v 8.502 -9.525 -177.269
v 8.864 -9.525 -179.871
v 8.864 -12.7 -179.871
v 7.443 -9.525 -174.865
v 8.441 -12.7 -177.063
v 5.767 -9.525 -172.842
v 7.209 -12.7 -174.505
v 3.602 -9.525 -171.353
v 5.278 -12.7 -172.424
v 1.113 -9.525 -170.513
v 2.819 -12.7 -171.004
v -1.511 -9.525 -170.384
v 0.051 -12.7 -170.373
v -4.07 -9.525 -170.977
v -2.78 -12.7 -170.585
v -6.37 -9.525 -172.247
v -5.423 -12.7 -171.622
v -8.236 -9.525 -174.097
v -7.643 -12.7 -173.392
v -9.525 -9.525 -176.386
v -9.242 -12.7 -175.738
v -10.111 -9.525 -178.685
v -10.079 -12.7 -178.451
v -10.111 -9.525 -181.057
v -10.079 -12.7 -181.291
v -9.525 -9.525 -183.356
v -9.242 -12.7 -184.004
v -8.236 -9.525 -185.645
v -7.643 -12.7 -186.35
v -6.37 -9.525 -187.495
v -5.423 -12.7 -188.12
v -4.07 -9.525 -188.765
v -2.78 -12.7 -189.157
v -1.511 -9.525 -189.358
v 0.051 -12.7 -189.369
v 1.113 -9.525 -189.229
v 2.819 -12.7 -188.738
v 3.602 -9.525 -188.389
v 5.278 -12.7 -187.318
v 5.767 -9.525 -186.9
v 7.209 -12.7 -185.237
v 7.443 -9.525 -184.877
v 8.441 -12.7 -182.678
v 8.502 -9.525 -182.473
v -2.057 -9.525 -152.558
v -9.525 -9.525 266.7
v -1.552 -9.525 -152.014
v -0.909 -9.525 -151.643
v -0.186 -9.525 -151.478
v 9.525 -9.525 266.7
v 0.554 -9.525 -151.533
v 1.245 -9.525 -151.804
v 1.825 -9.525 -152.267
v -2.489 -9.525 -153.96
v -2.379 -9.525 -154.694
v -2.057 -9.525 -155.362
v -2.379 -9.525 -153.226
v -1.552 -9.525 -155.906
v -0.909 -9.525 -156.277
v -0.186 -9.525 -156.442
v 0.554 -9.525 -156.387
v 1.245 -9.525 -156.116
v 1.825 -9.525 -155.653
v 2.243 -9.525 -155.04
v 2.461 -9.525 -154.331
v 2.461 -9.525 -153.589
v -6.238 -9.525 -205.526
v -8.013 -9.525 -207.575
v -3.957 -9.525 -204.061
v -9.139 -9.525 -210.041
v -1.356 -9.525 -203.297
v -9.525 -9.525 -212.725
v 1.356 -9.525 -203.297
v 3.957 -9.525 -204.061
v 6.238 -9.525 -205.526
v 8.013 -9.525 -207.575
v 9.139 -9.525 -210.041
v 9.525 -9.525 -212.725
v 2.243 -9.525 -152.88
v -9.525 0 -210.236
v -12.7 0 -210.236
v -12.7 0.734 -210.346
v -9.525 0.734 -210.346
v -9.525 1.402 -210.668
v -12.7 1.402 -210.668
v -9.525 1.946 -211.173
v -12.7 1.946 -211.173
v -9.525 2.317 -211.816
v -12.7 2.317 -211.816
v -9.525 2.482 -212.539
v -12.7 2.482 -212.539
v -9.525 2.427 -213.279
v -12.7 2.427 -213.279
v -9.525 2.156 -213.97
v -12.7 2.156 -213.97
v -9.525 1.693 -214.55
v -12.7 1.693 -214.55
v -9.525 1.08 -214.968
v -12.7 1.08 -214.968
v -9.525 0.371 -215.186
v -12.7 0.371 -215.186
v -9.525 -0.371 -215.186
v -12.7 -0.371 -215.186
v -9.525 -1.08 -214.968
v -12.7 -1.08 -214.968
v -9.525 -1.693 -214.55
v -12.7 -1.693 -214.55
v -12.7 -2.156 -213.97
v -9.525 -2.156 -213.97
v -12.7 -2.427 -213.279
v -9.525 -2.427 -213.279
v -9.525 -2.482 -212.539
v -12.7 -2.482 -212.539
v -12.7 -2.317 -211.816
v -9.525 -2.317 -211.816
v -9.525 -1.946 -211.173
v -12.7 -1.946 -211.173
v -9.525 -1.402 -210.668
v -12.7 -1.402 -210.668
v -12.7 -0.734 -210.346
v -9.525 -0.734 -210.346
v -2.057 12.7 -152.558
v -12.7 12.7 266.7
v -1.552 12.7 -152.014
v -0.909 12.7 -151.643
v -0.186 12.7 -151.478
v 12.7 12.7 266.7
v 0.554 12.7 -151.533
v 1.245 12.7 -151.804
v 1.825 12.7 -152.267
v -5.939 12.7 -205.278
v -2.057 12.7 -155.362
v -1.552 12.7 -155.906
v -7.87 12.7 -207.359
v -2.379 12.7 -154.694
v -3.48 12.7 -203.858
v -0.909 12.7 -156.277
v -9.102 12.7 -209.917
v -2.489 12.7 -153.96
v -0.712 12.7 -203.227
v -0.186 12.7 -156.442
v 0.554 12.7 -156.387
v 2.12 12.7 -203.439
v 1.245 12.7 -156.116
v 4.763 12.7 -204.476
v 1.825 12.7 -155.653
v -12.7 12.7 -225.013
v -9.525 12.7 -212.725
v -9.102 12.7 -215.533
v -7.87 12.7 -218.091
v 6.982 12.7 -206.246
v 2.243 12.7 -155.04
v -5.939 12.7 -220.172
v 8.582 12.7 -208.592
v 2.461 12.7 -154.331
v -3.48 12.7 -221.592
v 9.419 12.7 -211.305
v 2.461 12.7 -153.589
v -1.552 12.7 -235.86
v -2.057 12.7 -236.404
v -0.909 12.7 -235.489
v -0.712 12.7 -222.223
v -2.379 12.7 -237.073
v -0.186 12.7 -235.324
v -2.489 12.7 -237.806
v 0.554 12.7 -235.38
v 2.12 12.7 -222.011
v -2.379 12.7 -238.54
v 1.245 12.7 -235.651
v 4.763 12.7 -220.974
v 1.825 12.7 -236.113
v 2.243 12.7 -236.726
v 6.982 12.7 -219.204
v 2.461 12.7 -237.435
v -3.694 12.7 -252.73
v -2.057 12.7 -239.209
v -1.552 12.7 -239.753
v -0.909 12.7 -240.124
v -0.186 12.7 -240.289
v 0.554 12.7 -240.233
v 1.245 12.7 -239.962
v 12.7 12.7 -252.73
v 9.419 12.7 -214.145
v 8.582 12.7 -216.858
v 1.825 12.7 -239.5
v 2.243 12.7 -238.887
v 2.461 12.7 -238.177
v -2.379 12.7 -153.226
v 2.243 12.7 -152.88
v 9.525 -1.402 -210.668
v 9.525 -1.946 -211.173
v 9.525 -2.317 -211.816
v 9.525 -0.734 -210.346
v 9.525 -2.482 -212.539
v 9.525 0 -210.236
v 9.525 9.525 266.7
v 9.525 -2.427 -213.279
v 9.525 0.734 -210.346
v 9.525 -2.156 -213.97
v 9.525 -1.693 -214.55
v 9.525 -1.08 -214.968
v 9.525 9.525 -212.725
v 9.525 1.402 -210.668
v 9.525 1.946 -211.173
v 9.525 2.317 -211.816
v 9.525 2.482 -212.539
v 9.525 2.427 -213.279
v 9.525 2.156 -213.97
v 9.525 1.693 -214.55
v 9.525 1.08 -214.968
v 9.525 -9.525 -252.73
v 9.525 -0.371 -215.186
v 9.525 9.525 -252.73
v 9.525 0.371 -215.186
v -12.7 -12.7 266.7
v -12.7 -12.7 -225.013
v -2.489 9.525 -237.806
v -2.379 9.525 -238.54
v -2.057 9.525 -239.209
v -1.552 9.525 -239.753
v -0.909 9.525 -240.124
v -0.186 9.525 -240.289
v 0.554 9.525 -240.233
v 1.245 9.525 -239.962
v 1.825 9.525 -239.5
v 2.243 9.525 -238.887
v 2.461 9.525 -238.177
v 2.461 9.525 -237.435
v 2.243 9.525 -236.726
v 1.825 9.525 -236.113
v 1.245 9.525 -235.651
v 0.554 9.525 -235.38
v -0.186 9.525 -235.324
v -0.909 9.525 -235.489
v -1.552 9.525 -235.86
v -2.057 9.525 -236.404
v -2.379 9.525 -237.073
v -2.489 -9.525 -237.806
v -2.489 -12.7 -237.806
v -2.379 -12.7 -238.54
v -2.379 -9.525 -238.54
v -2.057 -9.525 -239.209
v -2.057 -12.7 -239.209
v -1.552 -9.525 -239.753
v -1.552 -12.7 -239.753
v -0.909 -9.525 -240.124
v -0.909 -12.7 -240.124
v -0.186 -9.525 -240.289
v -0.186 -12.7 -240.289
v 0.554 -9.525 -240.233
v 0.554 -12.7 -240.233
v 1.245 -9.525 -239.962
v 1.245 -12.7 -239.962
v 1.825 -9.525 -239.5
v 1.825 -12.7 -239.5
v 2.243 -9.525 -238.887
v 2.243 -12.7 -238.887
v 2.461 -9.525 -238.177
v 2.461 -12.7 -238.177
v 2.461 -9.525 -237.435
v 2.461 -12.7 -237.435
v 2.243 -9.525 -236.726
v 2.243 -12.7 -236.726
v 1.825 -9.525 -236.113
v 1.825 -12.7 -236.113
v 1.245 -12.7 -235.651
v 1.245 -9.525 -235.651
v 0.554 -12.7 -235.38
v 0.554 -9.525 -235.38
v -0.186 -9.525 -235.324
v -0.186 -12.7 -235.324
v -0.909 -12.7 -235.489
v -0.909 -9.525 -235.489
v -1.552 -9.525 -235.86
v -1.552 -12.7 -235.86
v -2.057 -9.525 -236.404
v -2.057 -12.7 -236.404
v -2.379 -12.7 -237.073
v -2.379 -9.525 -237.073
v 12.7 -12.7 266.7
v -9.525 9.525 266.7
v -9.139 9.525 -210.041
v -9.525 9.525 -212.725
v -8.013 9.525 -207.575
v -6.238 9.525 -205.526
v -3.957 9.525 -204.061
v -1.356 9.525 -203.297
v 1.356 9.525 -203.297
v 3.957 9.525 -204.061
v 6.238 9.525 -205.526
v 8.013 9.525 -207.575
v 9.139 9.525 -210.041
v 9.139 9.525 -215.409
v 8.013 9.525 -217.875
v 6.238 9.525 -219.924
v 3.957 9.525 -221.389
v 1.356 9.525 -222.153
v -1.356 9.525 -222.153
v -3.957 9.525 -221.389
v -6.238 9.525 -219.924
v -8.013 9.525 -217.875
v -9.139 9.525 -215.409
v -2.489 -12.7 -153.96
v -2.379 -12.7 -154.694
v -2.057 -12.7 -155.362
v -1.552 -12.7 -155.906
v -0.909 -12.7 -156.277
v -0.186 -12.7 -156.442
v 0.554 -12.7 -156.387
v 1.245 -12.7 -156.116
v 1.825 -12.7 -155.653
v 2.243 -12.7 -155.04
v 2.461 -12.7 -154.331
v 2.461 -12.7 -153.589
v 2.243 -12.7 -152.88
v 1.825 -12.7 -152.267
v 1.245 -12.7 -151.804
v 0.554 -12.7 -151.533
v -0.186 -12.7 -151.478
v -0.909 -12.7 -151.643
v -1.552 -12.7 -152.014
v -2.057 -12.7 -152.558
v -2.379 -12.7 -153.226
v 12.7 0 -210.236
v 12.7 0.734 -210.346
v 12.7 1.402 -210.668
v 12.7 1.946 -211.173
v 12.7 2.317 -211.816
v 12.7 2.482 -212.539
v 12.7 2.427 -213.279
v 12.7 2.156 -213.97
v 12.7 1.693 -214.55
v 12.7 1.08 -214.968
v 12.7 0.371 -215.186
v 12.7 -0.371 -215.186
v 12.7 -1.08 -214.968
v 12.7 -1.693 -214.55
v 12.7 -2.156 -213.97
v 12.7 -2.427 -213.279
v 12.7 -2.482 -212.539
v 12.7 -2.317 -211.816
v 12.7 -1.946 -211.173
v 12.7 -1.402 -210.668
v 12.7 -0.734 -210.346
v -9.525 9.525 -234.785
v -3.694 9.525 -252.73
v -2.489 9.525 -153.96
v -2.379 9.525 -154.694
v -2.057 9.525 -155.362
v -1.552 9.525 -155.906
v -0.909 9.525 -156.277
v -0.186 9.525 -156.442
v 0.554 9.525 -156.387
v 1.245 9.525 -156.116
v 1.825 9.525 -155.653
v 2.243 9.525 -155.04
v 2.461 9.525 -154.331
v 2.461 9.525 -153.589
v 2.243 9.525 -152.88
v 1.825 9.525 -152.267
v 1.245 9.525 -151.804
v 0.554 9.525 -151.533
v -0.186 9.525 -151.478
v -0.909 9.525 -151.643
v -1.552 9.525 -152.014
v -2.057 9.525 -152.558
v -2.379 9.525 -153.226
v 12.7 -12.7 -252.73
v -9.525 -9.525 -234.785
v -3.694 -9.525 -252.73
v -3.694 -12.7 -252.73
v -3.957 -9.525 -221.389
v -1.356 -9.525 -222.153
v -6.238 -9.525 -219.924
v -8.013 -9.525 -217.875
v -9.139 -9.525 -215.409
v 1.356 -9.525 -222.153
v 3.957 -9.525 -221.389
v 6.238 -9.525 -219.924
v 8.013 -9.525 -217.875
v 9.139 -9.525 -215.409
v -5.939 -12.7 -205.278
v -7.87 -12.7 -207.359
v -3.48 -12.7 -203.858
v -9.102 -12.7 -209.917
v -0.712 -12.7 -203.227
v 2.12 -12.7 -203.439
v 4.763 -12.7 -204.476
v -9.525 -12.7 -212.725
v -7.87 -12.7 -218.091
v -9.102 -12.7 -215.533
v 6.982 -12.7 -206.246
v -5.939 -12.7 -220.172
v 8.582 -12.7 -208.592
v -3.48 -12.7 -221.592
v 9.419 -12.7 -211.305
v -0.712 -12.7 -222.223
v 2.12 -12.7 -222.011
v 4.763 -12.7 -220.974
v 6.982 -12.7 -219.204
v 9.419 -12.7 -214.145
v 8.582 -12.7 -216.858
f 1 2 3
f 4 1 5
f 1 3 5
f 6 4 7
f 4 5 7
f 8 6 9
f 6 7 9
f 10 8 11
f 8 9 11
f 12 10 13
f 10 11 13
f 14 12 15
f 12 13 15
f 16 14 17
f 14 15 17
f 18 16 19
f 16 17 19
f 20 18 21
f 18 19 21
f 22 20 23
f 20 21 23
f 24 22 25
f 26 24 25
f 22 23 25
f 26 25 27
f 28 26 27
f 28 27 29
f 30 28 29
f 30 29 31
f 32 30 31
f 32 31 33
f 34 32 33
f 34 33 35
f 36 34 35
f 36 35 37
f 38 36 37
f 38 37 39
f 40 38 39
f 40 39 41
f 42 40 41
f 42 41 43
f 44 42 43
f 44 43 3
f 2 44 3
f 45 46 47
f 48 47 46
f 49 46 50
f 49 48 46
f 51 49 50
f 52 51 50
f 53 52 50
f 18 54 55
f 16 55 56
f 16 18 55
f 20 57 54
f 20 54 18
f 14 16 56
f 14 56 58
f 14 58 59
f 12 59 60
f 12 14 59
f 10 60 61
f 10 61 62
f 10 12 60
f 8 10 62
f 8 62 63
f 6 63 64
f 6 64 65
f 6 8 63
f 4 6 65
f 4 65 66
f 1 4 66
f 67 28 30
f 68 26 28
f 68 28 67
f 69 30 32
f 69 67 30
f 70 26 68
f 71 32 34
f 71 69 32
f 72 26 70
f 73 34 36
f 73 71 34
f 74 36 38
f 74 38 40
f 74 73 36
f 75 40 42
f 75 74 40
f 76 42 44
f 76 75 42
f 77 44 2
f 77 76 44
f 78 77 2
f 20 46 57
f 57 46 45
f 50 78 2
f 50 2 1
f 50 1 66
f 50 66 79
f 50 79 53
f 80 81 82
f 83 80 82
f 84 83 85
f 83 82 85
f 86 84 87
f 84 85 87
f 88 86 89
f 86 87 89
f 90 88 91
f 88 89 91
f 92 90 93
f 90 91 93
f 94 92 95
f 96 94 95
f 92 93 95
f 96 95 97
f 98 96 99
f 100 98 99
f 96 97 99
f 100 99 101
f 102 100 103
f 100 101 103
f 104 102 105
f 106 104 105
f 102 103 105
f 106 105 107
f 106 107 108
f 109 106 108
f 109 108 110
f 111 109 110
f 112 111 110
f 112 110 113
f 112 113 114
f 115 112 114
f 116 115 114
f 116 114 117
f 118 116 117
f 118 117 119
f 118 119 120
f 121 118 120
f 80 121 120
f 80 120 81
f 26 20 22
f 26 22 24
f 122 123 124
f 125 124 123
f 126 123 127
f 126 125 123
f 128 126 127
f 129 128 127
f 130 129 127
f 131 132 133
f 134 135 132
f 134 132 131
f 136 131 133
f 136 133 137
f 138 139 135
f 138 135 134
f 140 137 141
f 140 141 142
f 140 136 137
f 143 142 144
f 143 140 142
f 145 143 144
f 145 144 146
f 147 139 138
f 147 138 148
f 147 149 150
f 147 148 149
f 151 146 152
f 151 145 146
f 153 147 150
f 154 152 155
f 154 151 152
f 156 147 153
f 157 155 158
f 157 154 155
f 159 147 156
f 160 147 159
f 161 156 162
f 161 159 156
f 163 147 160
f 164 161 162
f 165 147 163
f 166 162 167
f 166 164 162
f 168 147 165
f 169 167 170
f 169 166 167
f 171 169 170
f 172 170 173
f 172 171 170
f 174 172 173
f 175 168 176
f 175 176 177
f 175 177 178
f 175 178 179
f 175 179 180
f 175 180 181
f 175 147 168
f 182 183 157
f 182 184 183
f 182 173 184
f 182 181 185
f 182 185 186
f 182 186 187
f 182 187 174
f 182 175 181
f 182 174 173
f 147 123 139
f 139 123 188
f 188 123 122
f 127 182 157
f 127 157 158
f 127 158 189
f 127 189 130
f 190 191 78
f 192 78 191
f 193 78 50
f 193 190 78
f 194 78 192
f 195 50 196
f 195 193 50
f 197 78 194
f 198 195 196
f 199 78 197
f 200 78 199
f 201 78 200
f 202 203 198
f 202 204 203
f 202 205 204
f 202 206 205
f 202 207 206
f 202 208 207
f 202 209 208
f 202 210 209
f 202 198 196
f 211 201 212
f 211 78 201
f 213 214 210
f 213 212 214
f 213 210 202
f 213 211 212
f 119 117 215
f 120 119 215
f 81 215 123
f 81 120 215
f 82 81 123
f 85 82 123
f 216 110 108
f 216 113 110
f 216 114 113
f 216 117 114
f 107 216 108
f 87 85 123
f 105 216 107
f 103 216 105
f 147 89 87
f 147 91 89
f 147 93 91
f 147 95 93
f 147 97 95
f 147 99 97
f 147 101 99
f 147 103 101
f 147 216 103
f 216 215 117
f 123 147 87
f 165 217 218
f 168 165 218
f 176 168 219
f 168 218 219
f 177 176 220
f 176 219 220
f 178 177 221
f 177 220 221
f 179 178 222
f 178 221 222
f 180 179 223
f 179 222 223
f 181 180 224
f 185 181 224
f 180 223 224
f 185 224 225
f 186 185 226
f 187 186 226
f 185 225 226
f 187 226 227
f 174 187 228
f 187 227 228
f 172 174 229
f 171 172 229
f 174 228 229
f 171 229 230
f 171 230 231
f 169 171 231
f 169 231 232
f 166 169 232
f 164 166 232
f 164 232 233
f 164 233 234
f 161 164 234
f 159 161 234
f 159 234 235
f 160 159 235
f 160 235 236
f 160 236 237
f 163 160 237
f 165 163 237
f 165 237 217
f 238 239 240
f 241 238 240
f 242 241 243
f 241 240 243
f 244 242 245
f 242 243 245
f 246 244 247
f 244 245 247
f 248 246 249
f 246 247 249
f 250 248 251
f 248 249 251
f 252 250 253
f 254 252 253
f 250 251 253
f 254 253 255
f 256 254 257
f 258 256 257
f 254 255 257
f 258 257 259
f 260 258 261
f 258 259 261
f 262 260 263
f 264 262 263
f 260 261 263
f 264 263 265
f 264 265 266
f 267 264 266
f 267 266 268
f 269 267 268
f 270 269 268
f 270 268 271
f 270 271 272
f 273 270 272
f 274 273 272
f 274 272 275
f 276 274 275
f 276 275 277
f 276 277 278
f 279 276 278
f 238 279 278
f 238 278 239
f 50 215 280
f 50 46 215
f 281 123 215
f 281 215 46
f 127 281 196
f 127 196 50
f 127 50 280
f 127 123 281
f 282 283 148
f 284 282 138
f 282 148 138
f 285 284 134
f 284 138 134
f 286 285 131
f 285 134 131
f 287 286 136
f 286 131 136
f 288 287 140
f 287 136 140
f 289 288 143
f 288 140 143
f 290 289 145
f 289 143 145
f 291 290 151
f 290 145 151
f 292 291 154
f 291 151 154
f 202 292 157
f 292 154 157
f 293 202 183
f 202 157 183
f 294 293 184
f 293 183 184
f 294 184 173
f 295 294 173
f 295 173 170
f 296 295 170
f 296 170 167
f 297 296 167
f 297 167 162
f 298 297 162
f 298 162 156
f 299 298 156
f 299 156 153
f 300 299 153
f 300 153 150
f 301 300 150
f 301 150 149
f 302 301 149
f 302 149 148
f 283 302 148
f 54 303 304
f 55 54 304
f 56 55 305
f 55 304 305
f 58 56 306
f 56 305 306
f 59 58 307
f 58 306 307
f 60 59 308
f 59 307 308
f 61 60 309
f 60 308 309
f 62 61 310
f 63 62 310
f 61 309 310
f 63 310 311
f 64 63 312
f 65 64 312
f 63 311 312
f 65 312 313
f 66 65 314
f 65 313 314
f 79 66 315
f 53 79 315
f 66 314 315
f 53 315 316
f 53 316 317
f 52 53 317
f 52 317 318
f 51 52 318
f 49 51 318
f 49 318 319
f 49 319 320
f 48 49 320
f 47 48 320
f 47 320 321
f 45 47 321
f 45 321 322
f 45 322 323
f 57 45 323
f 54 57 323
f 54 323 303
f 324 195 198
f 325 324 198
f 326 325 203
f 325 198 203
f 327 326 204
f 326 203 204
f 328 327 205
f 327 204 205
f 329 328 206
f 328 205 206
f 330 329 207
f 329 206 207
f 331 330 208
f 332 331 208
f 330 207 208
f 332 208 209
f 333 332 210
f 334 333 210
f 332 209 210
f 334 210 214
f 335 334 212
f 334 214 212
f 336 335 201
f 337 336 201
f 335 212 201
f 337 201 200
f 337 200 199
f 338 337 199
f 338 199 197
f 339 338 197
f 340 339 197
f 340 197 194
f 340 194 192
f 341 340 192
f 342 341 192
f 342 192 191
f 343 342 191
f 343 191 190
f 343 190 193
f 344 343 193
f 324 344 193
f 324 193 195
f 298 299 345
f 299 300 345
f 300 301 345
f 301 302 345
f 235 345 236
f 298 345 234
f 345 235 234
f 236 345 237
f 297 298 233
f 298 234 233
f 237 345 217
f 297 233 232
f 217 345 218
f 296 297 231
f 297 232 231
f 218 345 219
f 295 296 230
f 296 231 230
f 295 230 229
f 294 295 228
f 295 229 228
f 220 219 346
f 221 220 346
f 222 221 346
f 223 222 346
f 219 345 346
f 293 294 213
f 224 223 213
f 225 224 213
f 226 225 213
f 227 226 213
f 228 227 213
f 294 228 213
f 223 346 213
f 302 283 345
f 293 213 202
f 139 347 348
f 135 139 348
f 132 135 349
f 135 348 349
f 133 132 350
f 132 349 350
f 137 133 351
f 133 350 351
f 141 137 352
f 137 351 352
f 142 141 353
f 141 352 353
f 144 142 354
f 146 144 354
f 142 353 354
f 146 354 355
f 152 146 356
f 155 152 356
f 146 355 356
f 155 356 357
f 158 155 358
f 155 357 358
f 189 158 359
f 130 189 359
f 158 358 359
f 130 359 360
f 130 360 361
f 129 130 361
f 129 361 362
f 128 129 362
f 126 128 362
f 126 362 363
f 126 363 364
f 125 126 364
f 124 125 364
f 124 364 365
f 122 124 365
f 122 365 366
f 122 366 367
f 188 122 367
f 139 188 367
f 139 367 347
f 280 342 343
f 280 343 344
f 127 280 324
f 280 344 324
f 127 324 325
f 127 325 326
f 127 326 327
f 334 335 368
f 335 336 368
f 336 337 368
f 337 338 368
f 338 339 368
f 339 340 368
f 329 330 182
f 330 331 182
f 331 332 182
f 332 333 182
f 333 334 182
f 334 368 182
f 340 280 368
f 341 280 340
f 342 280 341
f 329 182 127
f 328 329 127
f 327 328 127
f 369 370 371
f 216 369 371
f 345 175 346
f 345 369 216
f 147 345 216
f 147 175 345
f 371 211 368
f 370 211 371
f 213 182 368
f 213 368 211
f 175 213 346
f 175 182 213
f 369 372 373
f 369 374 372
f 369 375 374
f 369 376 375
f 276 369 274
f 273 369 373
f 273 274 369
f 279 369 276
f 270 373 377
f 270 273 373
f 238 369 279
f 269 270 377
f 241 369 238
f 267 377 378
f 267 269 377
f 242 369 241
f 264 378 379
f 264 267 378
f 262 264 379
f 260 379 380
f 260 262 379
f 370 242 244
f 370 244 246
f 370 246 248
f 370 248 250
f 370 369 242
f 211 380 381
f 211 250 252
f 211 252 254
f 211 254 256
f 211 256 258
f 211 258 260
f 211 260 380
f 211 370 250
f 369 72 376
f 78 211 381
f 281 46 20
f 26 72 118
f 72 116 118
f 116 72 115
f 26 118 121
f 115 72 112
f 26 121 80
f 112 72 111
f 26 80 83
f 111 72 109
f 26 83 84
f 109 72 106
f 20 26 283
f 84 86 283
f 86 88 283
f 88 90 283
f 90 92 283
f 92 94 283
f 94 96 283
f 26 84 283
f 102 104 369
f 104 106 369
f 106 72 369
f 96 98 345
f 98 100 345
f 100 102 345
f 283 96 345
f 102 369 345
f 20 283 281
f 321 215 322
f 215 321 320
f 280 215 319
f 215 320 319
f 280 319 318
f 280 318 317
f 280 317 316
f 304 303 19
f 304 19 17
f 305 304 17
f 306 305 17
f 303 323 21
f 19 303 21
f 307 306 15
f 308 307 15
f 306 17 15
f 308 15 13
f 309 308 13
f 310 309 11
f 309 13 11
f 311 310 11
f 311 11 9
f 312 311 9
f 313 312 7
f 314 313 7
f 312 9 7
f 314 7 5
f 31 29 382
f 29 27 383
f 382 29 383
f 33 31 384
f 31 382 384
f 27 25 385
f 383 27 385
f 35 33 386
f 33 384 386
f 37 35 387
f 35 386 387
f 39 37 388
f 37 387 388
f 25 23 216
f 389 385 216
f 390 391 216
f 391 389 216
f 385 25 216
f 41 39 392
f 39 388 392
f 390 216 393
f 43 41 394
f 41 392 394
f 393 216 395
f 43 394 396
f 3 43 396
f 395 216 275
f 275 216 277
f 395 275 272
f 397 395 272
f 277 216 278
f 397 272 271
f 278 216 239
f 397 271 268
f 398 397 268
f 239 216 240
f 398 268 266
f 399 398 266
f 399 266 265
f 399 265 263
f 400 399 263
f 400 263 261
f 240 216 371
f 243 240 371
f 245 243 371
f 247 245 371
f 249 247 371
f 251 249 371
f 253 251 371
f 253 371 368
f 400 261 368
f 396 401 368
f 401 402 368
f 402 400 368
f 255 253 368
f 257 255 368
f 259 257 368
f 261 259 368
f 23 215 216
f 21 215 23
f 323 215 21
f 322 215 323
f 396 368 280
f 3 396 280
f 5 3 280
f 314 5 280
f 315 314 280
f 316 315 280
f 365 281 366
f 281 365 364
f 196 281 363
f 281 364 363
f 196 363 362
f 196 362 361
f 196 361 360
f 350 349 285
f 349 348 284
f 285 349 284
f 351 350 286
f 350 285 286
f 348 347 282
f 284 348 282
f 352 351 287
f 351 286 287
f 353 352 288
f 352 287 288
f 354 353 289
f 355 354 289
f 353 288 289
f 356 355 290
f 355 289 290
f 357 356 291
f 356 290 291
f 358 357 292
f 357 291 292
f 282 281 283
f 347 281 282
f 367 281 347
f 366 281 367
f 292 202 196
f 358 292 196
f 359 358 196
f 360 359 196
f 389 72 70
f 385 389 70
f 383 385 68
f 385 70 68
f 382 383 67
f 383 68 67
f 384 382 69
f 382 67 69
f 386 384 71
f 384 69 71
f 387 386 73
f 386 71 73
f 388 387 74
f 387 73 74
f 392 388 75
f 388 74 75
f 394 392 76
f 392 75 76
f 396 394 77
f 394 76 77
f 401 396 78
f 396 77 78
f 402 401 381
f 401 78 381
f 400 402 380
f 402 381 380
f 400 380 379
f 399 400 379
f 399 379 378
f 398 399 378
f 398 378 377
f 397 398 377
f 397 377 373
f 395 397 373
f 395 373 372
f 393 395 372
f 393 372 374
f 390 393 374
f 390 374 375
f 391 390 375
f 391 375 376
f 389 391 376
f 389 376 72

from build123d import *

# Parameters (mm, degrees)
BOSS_EXTRUDE1_DEPTH      = 266.7
BOSS_EXTRUDE1_DEPTH_BACK = 266.7
SKETCH3_W                = 25.4
SKETCH3_H                = 25.4
SKETCH3_W_2              = 19.05
SKETCH3_H_2              = 19.05
SKETCH4_R                = 9.525
CUT_EXTRUDE1_DEPTH       = 25.4
SKETCH5_R                = 9.525
CUT_EXTRUDE2_DEPTH       = 3.175
F_10_CLEARANCE_HOLE1_D   = 4.9784
F_10_CLEARANCE_HOLE2_D   = 4.9784


with BuildPart() as part:
    # Sketch3 → Boss-Extrude1 (new, two sides: drawn at the far end of the back side and taken through both)
    with BuildSketch(Plane.XY.offset(-BOSS_EXTRUDE1_DEPTH_BACK)):
        Rectangle(SKETCH3_W, SKETCH3_H)
        Rectangle(SKETCH3_W_2, SKETCH3_H_2, mode=Mode.SUBTRACT)
    extrude(amount=BOSS_EXTRUDE1_DEPTH + BOSS_EXTRUDE1_DEPTH_BACK)

    # Sketch4 → Cut-Extrude1 (cut)
    with BuildSketch(Plane(origin=(0, 12.7, 0), x_dir=(1, 0, 0), z_dir=(0, 1, 0))):
        with Locations(Location((0, 212.725, 0), (0, 0, 180))):
            Circle(SKETCH4_R)
        Polygon((-12.7, 225.013453558), (-12.7, 266.7), (12.7, 266.7), (12.7, 252.73), (-3.69434815, 252.73), align=None)
    extrude(amount=-CUT_EXTRUDE1_DEPTH, mode=Mode.SUBTRACT)

    # Sketch5 → Cut-Extrude2 (cut)
    with BuildSketch(Plane.XZ.offset(12.7)):
        with Locations((-0.660548484, -179.870948658)):
            Circle(SKETCH5_R)
    extrude(amount=-CUT_EXTRUDE2_DEPTH, mode=Mode.SUBTRACT)

    # #10 Clearance Hole1 (through all)
    with Locations(Plane(origin=(12.7, 0, 0), x_dir=(0, 0, -1), z_dir=(1, 0, 0))):
        with Locations((212.725, 0)):
            Hole(F_10_CLEARANCE_HOLE1_D / 2)

    # #10 Clearance Hole2 (through all)
    with Locations(Plane(origin=(0, 12.7, 0), x_dir=(1, 0, 0), z_dir=(0, 1, 0))):
        with Locations((0, 153.95996007), (0, 237.806480142)):
            Hole(F_10_CLEARANCE_HOLE2_D / 2)


solid = part.part
